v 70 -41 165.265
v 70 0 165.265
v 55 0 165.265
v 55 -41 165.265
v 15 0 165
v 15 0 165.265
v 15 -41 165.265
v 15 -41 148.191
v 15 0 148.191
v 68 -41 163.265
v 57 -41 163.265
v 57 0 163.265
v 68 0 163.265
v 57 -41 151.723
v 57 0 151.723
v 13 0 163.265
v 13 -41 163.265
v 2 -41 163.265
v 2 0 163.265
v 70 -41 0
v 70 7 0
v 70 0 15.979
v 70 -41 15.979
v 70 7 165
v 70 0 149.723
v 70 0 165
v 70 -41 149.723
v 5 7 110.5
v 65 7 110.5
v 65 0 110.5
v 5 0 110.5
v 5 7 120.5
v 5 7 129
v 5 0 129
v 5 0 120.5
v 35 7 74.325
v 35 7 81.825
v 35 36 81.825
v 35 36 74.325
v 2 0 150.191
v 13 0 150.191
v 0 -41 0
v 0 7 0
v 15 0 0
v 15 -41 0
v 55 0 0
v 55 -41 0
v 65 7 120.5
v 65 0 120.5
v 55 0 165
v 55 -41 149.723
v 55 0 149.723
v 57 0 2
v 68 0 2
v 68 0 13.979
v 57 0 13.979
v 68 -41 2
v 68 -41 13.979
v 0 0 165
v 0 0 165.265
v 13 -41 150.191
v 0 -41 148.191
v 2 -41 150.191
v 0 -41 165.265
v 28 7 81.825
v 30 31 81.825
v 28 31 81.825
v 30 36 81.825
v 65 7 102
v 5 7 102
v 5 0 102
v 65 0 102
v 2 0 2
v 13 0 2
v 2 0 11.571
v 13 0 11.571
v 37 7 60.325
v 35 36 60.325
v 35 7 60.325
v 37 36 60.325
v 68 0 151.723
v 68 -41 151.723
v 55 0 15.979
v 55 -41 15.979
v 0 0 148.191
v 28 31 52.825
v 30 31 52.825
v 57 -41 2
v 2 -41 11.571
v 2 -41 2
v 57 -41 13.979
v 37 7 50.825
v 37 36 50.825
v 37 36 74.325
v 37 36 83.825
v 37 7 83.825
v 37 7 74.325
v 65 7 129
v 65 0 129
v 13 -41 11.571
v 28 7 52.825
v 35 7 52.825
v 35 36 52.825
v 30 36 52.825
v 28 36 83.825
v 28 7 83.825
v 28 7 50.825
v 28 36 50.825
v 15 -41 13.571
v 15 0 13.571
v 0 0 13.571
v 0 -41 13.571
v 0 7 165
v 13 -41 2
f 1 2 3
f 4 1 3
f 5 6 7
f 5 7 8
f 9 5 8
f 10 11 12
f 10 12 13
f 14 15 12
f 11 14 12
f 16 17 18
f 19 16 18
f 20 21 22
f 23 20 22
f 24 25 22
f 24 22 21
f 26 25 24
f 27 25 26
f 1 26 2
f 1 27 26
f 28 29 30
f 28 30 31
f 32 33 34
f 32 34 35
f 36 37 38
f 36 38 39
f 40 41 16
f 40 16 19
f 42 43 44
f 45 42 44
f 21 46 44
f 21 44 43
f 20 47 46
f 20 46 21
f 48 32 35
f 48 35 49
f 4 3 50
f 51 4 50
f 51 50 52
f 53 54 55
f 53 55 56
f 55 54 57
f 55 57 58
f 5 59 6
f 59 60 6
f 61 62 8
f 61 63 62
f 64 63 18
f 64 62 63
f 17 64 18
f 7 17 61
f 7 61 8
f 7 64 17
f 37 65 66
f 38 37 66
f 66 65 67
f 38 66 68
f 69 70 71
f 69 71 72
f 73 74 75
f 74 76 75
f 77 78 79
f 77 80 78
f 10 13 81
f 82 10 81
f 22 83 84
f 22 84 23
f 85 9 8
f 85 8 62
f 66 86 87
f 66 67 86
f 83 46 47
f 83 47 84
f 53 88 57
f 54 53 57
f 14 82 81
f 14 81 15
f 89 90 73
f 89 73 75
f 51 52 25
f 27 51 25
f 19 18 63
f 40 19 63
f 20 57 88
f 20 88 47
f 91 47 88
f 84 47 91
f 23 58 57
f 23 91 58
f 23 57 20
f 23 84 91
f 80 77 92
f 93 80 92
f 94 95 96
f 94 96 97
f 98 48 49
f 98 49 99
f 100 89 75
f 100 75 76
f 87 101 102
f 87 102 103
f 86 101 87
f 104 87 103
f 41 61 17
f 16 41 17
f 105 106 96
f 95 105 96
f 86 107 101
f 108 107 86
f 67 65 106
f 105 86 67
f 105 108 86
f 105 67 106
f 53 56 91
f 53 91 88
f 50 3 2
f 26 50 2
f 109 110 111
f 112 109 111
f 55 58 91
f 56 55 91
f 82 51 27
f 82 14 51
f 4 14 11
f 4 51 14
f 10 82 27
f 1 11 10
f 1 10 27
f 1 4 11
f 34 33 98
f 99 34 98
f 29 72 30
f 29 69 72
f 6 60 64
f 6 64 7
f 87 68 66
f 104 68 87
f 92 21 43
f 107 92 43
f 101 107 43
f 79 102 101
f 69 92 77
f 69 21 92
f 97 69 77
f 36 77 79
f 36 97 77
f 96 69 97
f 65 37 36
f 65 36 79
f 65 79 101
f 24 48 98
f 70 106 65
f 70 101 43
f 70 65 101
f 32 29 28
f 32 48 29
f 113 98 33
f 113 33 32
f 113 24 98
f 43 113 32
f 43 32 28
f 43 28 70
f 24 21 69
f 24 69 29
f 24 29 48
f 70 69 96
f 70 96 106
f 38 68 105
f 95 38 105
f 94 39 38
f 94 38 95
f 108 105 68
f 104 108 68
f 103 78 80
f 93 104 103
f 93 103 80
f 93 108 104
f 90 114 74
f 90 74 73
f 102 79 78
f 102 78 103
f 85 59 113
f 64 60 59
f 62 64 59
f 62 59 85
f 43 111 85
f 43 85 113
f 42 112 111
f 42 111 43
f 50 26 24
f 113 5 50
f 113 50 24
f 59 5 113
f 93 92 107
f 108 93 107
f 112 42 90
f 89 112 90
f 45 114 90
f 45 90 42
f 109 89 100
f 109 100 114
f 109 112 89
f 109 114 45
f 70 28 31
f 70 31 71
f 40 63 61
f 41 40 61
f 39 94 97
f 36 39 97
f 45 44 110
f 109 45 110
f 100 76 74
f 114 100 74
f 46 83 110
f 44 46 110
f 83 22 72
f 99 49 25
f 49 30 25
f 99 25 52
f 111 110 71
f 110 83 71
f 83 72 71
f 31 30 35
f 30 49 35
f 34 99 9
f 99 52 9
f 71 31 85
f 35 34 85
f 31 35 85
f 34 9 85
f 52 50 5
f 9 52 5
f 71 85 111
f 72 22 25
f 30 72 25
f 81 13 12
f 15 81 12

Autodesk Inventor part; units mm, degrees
ref_plane "YZ Plane" through (0, 0, 0) normal (1, 0, 0) x (0, 1, 0)
ref_plane "XZ Plane" through (0, 0, 0) normal (0, 1, 0) x (-1, 0, 0)
ref_plane "XY Plane" through (0, 0, 0) normal (0, 0, 1) x (1, 0, 0)
sketch "Sketch1" plane through (0, 0, 0) normal (0, 1, 0) x (-1, 0, 0)
  line L0 (0, 0) -> (-70, 0)
  line L1 (-70, 0) -> (-70, 165)
  line L2 (-70, 165) -> (0, 165)
  line L3 (0, 165) -> (0, 0)
  dimension "d0" = 70
  dimension "d1" = 165
extrude "Extrusion1" add sketch "Sketch1" along normal blind 7
sketch "Sketch2" plane through (0, 0, 0) normal (0, -1, 0) x (1, 0, 0)
  line L0 (70, 165) -> (70, 0) projected
  line L1 (70, 0) -> (55, 0)
  line L2 (55, 0) -> (55, 15.9792)
  line L3 (55, 15.9792) -> (70, 15.9792)
  line L4 (70, 15.9792) -> (70, 0)
  line L5 (70, 0) -> (0, 0) projected
  line L6 (0, 0) -> (15, 0)
  line L7 (15, 0) -> (15, 13.5714)
  line L8 (15, 13.5714) -> (0, 13.5714)
  line L9 (0, 13.5714) -> (0, 0)
  line L10 (70, 165.2646) -> (55, 165.2646)
  line L11 (55, 165.2646) -> (55, 149.7232)
  line L12 (55, 149.7232) -> (70, 149.7232)
  line L13 (70, 149.7232) -> (70, 165.2646)
  line L14 (0, 165.2646) -> (15, 165.2646)
  line L15 (15, 165.2646) -> (15, 148.1909)
  line L16 (15, 148.1909) -> (0, 148.1909)
  line L17 (0, 148.1909) -> (0, 165.2646)
  line L18 (68, 151.7232) -> (57, 151.7232)
  line L19 (57, 151.7232) -> (57, 163.2646)
  line L20 (57, 163.2646) -> (68, 163.2646)
  line L21 (68, 163.2646) -> (68, 151.7232)
  line L22 (2, 150.1909) -> (13, 150.1909)
  line L23 (13, 150.1909) -> (13, 163.2646)
  line L24 (13, 163.2646) -> (2, 163.2646)
  line L25 (2, 163.2646) -> (2, 150.1909)
  line L26 (2, 11.5714) -> (13, 11.5714)
  line L27 (13, 11.5714) -> (13, 2)
  line L28 (13, 2) -> (2, 2)
  line L29 (2, 2) -> (2, 11.5714)
  line L30 (68, 13.9792) -> (57, 13.9792)
  line L31 (57, 13.9792) -> (57, 2)
  line L32 (57, 2) -> (68, 2)
  line L33 (68, 2) -> (68, 13.9792)
  dimension "d4" = 15
  dimension "d5" = 15
  dimension "d6" = 15
  dimension "d7" = 15
  dimension "d8" = 2
  dimension "d9" = 2
  dimension "d10" = 2
  dimension "d11" = 2
extrude "Extrusion2" add sketch "Sketch2" along normal blind 41
sketch "Sketch3" plane through (0, 7, 0) normal (0, 1, 0) x (1, 0, 0)
  line L0 (18.4911, -158.4869) -> (54.4911, -158.4869) construction
  line L1 (0, -165) -> (70, -165) projected
  line L2 (0, -165) -> (0, -129)
  line L3 (0, -13.5714) -> (0, -148.1909) projected
  line L4 (0, -129) -> (70, -129)
  line L5 (70, -165) -> (70, 0) projected
  line L6 (70, -129) -> (5, -129)
  line L7 (5, -129) -> (5, -120.5)
  line L8 (5, -120.5) -> (70, -120.5)
  line L9 (70, -120.5) -> (70, -129)
  line L10 (70, -110.5) -> (5, -110.5)
  line L11 (5, -110.5) -> (5, -102)
  line L12 (5, -102) -> (70, -102)
  line L13 (70, -102) -> (70, -110.5)
  line L14 (5, -102) -> (65, -102)
  line L15 (65, -182) -> (5, -182)
  line L16 (5, -182) -> (5, -102)
  line L17 (5, -120.5) -> (65, -120.5)
  line L18 (65, -120.5) -> (65, -129)
  line L19 (65, -129) -> (5, -129)
  line L20 (5, -129) -> (5, -120.5)
  line L21 (5, -102) -> (65, -102)
  line L22 (65, -102) -> (65, -110.5)
  line L23 (65, -110.5) -> (5, -110.5)
  line L24 (5, -110.5) -> (5, -102)
  point P0 (0, 0)
  dimension "d16" = 36
  dimension "d17" = 65
  dimension "d18" = 8.5
  dimension "d20" = 65
  dimension "d21" = 8.5
  dimension "d22" = 60
  dimension "d23" = 80
  dimension "d24" = 60
  dimension "d25" = 8.5
  dimension "d26" = 60
  dimension "d27" = 8.5
extrude "Extrusion3" cut sketch "Sketch3" against normal blind 7 contours L7 L8 L18 L4 | L11 L12 L22 L10
sketch "Sketch4" plane through (0, 7, 0) normal (0, 1, 0) x (1, 0, 0)
  line L0 (35, -52.8248) -> (30, -52.8248)
  line L1 (30, -52.8248) -> (30, -81.8248)
  line L2 (30, -81.8248) -> (35, -81.8248)
  line L3 (35, -81.8248) -> (35, -52.8248)
  line L4 (37, -50.8248) -> (28, -50.8248)
  line L5 (28, -50.8248) -> (28, -83.8248)
  line L6 (28, -83.8248) -> (37, -83.8248)
  line L7 (37, -83.8248) -> (37, -50.8248)
  point P0 (0, 0)
  dimension "d30" = 5
  dimension "d31" = 29
  dimension "d32" = 2
extrude "Extrusion4" add sketch "Sketch4" along normal blind 29
sketch "Sketch5" plane through (28, 7, 50.8248) normal (-1, 0, 0) x (0, 0, 1)
  line L0 (2, 0) -> (2, 29) projected
  line L1 (2, 29) -> (2, 0)
  line L2 (31, 0) -> (31, 29) projected
  line L3 (2, 0) -> (31, 0)
  line L4 (31, 0) -> (31, 29)
  line L5 (31, 29) -> (2, 29)
  line L6 (2, 29) -> (31, 29)
  line L7 (31, 29) -> (31, 26)
  line L8 (31, 26) -> (2, 26)
  line L9 (2, 26) -> (2, 29)
  line L10 (2, 26) -> (31, 26)
  line L11 (31, 26) -> (31, 0)
  line L12 (31, 0) -> (2, 0)
  line L13 (2, 0) -> (2, 26)
  point P0 (-50.8248, -7)
  dimension "d35" = 29
  dimension "d36" = 3
extrude "Extrusion5" cut sketch "Sketch5" against normal blind 2 contours L0 L8 L2 L3
sketch "Sketch6" plane through (37, 7, 83.8248) normal (1, 0, 0) x (0, 0, -1)
  line L0 (2, 29) -> (31, 29) projected
  line L1 (16.5, 29) -> (16.5, 0)
  line L2 (2, 0) -> (31, 0) projected
  line L3 (23.5, 29) -> (23.5, 0)
  line L4 (9.5, 29) -> (9.5, 0)
  line L5 (9.5, 29) -> (23.5, 29)
  line L6 (23.5, 29) -> (23.5, 0)
  line L7 (23.5, 0) -> (9.5, 0)
  line L8 (9.5, 0) -> (9.5, 29)
  point P0 (83.8248, -7)
  point P1 (23.5, 0)
  point P2 (23.5, 29)
  point P3 (9.5, 29)
  point P4 (9.5, 0)
  dimension "d39" = 7
  dimension "d40" = 7
extrude "Extrusion6" cut sketch "Sketch6" against normal blind 2
sketch "Sketch7" plane through (28, 33, 52.8248) normal (0, -1, 0) x (1, 0, 0)
  line L0 (0, 0) -> (0, 29) projected
  line L1 (2, 29) -> (2, 0) projected
  line L2 (0, 0) -> (2, 0)
  line L3 (2, 0) -> (2, 29)
  line L4 (2, 29) -> (0, 29)
  line L5 (0, 29) -> (0, 0)
  point P0 (-28, -52.8248)
  point P1 (2, 0)
extrude "Extrusion7" add sketch "Sketch7" along normal blind 2
properties part number "piano laterale"
